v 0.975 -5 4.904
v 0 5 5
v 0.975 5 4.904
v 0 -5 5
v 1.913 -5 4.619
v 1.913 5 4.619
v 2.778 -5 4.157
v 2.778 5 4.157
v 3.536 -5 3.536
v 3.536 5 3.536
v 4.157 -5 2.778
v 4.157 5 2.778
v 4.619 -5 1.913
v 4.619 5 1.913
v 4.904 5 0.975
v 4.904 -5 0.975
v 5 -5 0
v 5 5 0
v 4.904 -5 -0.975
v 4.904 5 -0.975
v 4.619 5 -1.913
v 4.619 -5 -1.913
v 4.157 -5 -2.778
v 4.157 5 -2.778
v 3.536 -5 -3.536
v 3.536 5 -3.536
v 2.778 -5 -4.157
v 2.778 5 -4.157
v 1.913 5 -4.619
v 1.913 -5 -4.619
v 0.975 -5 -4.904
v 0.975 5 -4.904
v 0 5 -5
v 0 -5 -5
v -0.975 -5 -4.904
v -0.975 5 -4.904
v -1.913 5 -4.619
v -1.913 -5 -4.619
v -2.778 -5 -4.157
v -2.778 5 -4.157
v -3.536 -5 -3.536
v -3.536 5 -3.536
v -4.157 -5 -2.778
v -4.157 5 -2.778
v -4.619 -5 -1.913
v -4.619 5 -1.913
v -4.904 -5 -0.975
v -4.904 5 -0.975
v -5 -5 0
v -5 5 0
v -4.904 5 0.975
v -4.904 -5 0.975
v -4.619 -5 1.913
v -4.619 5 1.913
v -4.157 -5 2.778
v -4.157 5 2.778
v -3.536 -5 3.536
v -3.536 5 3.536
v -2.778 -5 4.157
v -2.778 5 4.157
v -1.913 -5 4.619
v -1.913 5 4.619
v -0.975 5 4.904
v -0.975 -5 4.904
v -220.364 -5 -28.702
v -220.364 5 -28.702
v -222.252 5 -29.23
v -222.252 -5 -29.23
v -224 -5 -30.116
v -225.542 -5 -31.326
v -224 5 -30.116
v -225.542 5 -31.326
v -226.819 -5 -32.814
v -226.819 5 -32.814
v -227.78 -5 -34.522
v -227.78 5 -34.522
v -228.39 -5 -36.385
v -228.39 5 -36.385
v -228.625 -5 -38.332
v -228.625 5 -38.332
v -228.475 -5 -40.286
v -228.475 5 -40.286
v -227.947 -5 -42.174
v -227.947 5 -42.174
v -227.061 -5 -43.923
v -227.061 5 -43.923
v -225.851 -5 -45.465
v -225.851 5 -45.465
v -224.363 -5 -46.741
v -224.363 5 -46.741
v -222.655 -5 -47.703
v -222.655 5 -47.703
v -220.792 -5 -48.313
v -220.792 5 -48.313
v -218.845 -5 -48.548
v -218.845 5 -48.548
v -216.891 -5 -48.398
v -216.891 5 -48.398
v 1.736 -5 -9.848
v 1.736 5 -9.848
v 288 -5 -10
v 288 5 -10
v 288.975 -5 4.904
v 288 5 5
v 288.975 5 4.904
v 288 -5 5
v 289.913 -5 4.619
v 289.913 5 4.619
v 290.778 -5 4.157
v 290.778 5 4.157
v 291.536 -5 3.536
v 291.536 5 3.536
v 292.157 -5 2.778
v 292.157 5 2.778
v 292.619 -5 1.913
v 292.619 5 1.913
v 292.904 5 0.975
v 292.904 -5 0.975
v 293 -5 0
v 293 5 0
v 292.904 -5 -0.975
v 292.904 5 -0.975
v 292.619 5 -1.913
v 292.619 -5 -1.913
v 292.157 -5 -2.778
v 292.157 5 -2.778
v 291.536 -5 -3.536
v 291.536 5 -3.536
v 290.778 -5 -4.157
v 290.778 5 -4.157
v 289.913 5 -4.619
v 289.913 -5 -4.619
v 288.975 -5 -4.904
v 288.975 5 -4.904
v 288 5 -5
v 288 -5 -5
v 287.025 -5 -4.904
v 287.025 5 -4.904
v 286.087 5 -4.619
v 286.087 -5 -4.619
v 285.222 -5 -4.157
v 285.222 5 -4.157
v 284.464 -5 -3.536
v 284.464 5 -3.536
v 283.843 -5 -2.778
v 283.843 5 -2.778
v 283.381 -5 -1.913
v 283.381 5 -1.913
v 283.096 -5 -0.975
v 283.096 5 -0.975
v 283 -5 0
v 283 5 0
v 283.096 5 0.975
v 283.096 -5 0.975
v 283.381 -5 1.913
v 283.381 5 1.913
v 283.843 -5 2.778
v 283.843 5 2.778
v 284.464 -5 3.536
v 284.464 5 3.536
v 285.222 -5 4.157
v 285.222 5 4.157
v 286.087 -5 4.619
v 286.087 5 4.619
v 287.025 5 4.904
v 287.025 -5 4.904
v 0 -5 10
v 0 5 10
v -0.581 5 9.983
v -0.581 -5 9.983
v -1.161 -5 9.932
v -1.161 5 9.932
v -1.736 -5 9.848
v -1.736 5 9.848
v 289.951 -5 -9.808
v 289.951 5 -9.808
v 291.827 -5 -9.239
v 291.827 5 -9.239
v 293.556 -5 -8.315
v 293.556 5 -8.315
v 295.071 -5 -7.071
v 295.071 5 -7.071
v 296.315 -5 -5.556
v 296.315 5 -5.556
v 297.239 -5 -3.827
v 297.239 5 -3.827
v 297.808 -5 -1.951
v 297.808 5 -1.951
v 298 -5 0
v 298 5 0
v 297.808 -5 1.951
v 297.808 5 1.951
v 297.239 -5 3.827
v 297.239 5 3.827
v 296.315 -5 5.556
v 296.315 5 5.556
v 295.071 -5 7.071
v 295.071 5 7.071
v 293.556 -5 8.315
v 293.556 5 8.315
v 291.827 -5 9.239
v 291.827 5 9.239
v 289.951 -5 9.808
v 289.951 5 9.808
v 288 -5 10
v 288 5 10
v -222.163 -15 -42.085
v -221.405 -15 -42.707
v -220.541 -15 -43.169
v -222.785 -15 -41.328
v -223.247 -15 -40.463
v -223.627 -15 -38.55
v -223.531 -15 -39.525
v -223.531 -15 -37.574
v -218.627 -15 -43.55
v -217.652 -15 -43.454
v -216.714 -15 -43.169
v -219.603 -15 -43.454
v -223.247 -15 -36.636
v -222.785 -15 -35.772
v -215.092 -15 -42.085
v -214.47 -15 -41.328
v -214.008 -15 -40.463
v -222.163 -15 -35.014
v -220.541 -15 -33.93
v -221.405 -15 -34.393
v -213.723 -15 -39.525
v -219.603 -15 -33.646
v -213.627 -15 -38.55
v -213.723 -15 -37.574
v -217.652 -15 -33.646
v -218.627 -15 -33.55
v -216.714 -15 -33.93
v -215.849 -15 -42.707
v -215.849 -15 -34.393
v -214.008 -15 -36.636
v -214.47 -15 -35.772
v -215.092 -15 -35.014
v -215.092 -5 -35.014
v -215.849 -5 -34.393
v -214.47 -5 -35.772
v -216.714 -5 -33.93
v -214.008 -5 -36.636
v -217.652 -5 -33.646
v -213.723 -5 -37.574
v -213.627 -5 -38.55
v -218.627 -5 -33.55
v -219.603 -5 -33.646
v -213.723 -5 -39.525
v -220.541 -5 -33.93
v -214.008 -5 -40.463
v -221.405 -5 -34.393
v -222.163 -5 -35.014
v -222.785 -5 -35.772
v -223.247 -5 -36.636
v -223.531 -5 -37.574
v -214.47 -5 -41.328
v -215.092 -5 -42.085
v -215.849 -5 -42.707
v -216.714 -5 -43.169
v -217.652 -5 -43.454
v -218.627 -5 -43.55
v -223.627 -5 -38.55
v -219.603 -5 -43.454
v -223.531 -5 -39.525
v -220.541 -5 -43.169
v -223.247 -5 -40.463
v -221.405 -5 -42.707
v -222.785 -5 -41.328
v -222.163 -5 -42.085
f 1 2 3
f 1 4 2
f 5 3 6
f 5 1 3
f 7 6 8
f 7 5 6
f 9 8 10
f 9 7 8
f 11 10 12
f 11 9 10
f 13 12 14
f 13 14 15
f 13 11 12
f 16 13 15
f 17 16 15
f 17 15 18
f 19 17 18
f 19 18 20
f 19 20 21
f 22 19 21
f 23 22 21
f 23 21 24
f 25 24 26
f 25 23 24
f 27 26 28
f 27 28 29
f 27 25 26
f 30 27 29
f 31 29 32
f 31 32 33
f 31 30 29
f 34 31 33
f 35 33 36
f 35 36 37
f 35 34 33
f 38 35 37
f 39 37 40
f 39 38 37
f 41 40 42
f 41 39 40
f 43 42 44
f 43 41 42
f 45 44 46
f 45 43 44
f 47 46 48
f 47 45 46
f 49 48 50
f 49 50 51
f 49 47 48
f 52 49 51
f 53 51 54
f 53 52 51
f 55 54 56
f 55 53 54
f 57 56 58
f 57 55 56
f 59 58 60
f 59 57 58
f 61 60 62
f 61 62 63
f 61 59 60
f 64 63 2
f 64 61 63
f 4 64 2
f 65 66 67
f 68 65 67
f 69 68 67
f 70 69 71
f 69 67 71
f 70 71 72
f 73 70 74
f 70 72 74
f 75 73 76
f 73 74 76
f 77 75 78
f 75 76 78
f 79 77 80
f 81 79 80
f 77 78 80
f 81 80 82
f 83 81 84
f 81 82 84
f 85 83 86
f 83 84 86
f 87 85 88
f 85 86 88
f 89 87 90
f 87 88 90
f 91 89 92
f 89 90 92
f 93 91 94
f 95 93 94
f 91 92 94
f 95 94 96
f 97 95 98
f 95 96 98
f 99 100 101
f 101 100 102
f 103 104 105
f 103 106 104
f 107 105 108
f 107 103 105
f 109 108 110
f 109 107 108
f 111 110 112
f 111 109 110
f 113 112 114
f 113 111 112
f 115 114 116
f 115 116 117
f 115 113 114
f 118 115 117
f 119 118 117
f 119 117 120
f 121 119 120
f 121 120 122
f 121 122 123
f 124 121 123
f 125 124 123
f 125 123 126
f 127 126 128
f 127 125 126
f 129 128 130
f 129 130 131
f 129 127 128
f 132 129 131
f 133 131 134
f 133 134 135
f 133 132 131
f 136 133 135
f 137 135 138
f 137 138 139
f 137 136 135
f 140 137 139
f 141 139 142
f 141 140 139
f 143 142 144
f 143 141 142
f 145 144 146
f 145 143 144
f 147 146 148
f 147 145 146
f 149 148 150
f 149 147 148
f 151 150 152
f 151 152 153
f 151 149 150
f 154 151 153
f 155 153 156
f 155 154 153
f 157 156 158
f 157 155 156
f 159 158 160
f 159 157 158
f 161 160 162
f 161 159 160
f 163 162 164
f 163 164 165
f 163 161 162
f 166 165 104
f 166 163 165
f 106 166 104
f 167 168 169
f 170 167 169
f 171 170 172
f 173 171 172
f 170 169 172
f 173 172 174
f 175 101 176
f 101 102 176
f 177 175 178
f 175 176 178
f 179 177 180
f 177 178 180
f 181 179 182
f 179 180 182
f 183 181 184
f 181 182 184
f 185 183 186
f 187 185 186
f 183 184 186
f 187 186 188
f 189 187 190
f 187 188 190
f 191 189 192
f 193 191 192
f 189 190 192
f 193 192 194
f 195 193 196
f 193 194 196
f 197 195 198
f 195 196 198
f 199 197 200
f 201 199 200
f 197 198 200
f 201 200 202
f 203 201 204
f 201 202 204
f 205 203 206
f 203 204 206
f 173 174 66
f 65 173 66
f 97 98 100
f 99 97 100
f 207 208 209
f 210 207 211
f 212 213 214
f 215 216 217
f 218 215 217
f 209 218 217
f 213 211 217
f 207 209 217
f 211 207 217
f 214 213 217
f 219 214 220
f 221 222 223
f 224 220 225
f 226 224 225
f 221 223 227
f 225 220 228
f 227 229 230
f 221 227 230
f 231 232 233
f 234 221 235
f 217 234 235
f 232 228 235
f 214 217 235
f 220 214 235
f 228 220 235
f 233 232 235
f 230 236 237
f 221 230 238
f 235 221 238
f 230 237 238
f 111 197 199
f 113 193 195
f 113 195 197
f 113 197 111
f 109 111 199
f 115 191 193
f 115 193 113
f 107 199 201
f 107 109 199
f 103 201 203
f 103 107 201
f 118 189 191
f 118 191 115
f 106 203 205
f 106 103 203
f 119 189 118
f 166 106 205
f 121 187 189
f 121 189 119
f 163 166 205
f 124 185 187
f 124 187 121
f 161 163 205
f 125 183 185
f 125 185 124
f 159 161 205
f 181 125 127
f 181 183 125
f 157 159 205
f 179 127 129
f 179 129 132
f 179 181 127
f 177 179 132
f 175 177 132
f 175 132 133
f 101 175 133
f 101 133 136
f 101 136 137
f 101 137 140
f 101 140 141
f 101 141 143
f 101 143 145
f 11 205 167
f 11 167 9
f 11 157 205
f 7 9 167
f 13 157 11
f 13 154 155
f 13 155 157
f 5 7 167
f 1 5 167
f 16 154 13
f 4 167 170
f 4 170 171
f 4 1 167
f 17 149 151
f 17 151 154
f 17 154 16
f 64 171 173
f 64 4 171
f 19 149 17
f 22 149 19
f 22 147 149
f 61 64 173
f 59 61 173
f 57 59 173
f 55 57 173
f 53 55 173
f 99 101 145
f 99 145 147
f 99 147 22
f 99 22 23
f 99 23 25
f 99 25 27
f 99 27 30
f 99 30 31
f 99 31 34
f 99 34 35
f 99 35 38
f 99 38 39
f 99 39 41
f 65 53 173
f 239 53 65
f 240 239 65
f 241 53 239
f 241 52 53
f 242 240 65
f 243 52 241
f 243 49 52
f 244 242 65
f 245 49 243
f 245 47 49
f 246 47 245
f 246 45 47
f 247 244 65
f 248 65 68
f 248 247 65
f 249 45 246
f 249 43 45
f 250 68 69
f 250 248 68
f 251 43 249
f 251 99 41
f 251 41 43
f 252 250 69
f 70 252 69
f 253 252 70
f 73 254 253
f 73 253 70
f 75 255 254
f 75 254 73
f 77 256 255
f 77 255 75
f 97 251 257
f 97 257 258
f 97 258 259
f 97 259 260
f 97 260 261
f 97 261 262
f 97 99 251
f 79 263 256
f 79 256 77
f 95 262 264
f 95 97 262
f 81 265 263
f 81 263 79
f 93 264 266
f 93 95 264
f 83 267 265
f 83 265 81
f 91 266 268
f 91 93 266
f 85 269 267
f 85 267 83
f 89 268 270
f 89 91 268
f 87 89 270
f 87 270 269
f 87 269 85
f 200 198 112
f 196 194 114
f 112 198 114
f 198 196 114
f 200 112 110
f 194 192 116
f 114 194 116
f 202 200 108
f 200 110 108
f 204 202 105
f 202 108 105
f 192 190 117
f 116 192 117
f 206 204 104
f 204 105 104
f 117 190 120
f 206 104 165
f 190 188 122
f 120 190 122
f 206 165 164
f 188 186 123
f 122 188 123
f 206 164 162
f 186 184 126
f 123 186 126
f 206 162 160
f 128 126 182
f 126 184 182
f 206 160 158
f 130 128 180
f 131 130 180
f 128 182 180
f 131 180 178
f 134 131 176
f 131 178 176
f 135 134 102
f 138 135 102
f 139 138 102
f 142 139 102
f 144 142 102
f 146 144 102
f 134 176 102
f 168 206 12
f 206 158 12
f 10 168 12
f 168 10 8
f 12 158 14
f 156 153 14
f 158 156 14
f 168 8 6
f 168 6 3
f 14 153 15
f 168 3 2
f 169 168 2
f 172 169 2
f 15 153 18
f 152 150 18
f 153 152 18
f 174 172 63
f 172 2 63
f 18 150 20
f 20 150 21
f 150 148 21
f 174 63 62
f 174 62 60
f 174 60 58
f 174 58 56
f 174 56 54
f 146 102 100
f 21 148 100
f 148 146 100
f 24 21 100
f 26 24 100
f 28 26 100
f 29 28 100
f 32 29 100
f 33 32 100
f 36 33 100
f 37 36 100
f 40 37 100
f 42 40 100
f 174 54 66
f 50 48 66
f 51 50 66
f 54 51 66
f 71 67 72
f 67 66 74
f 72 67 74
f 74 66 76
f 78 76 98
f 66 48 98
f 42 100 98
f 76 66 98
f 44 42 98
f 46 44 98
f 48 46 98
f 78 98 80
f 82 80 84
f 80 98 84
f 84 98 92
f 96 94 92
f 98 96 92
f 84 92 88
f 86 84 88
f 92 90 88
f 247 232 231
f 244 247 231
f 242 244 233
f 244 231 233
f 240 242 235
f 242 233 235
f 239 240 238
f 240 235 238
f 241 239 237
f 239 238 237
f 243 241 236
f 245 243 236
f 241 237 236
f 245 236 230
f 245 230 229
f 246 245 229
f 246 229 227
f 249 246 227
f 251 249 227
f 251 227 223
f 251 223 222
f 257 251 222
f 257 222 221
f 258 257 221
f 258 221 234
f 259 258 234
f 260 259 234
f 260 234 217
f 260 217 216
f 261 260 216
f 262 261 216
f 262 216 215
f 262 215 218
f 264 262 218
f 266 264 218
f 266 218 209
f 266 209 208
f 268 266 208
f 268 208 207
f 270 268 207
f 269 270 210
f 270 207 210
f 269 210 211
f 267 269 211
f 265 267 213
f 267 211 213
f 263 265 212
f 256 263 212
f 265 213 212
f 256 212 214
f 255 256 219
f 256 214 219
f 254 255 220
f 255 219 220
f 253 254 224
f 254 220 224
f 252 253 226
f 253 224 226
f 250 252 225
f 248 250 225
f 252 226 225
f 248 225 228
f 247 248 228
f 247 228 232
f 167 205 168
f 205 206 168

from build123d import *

# Parameters (mm, degrees)
SKETCH1_R                = 5
BOSS_EXTRUDE1_DEPTH      = 5
BOSS_EXTRUDE2_DEPTH      = 5
BOSS_EXTRUDE2_DEPTH_BACK = 15
SKETCH2_R                = 5


with BuildPart() as part:
    # Sketch1 → Boss-Extrude1 (new, symmetric)
    with BuildSketch(Plane(origin=(0, 0, 0), x_dir=(1, 0, 0), z_dir=(0, 1, 0))):
        with BuildLine():
            Line((-216.890839392, 48.397972972), (1.736481777, 9.84807753))
            Line((1.736481777, 9.84807753), (288, 10))
            ThreePointArc((288, 10), (298, 0), (288, -10))
            Line((288, -10), (0, -10))
            ThreePointArc((0, -10), (-0.871557427, -9.961946981), (-1.736481777, -9.84807753))
            Line((-1.736481777, -9.84807753), (-220.363802945, 28.701817912))
            ThreePointArc((-220.363802945, 28.701817912), (-228.475398699, 40.286377219), (-216.890839392, 48.397972972))
        make_face()
        with Locations(Location((-218.627321169, 38.549895442, 0), (0, 0, 270))):
            Circle(SKETCH1_R, mode=Mode.SUBTRACT)
        with Locations(Location((0, 0, 0), (0, 0, 270))):
            Circle(SKETCH1_R, mode=Mode.SUBTRACT)
        with Locations(Location((288, 0, 0), (0, 0, 270))):
            Circle(SKETCH1_R, mode=Mode.SUBTRACT)
    extrude(amount=BOSS_EXTRUDE1_DEPTH, both=True)

    # Sketch2 → Boss-Extrude2 (add, two sides: drawn at the far end of the back side and taken through both)
    with BuildSketch(Plane(origin=(0, 0, 0), x_dir=(1, 0, 0), z_dir=(0, 1, 0)).offset(-BOSS_EXTRUDE2_DEPTH_BACK)):
        with Locations(Location((-218.627321169, 38.549895442, 0), (0, 0, 270))):
            Circle(SKETCH2_R)
    extrude(amount=BOSS_EXTRUDE2_DEPTH + BOSS_EXTRUDE2_DEPTH_BACK)


solid = part.part
